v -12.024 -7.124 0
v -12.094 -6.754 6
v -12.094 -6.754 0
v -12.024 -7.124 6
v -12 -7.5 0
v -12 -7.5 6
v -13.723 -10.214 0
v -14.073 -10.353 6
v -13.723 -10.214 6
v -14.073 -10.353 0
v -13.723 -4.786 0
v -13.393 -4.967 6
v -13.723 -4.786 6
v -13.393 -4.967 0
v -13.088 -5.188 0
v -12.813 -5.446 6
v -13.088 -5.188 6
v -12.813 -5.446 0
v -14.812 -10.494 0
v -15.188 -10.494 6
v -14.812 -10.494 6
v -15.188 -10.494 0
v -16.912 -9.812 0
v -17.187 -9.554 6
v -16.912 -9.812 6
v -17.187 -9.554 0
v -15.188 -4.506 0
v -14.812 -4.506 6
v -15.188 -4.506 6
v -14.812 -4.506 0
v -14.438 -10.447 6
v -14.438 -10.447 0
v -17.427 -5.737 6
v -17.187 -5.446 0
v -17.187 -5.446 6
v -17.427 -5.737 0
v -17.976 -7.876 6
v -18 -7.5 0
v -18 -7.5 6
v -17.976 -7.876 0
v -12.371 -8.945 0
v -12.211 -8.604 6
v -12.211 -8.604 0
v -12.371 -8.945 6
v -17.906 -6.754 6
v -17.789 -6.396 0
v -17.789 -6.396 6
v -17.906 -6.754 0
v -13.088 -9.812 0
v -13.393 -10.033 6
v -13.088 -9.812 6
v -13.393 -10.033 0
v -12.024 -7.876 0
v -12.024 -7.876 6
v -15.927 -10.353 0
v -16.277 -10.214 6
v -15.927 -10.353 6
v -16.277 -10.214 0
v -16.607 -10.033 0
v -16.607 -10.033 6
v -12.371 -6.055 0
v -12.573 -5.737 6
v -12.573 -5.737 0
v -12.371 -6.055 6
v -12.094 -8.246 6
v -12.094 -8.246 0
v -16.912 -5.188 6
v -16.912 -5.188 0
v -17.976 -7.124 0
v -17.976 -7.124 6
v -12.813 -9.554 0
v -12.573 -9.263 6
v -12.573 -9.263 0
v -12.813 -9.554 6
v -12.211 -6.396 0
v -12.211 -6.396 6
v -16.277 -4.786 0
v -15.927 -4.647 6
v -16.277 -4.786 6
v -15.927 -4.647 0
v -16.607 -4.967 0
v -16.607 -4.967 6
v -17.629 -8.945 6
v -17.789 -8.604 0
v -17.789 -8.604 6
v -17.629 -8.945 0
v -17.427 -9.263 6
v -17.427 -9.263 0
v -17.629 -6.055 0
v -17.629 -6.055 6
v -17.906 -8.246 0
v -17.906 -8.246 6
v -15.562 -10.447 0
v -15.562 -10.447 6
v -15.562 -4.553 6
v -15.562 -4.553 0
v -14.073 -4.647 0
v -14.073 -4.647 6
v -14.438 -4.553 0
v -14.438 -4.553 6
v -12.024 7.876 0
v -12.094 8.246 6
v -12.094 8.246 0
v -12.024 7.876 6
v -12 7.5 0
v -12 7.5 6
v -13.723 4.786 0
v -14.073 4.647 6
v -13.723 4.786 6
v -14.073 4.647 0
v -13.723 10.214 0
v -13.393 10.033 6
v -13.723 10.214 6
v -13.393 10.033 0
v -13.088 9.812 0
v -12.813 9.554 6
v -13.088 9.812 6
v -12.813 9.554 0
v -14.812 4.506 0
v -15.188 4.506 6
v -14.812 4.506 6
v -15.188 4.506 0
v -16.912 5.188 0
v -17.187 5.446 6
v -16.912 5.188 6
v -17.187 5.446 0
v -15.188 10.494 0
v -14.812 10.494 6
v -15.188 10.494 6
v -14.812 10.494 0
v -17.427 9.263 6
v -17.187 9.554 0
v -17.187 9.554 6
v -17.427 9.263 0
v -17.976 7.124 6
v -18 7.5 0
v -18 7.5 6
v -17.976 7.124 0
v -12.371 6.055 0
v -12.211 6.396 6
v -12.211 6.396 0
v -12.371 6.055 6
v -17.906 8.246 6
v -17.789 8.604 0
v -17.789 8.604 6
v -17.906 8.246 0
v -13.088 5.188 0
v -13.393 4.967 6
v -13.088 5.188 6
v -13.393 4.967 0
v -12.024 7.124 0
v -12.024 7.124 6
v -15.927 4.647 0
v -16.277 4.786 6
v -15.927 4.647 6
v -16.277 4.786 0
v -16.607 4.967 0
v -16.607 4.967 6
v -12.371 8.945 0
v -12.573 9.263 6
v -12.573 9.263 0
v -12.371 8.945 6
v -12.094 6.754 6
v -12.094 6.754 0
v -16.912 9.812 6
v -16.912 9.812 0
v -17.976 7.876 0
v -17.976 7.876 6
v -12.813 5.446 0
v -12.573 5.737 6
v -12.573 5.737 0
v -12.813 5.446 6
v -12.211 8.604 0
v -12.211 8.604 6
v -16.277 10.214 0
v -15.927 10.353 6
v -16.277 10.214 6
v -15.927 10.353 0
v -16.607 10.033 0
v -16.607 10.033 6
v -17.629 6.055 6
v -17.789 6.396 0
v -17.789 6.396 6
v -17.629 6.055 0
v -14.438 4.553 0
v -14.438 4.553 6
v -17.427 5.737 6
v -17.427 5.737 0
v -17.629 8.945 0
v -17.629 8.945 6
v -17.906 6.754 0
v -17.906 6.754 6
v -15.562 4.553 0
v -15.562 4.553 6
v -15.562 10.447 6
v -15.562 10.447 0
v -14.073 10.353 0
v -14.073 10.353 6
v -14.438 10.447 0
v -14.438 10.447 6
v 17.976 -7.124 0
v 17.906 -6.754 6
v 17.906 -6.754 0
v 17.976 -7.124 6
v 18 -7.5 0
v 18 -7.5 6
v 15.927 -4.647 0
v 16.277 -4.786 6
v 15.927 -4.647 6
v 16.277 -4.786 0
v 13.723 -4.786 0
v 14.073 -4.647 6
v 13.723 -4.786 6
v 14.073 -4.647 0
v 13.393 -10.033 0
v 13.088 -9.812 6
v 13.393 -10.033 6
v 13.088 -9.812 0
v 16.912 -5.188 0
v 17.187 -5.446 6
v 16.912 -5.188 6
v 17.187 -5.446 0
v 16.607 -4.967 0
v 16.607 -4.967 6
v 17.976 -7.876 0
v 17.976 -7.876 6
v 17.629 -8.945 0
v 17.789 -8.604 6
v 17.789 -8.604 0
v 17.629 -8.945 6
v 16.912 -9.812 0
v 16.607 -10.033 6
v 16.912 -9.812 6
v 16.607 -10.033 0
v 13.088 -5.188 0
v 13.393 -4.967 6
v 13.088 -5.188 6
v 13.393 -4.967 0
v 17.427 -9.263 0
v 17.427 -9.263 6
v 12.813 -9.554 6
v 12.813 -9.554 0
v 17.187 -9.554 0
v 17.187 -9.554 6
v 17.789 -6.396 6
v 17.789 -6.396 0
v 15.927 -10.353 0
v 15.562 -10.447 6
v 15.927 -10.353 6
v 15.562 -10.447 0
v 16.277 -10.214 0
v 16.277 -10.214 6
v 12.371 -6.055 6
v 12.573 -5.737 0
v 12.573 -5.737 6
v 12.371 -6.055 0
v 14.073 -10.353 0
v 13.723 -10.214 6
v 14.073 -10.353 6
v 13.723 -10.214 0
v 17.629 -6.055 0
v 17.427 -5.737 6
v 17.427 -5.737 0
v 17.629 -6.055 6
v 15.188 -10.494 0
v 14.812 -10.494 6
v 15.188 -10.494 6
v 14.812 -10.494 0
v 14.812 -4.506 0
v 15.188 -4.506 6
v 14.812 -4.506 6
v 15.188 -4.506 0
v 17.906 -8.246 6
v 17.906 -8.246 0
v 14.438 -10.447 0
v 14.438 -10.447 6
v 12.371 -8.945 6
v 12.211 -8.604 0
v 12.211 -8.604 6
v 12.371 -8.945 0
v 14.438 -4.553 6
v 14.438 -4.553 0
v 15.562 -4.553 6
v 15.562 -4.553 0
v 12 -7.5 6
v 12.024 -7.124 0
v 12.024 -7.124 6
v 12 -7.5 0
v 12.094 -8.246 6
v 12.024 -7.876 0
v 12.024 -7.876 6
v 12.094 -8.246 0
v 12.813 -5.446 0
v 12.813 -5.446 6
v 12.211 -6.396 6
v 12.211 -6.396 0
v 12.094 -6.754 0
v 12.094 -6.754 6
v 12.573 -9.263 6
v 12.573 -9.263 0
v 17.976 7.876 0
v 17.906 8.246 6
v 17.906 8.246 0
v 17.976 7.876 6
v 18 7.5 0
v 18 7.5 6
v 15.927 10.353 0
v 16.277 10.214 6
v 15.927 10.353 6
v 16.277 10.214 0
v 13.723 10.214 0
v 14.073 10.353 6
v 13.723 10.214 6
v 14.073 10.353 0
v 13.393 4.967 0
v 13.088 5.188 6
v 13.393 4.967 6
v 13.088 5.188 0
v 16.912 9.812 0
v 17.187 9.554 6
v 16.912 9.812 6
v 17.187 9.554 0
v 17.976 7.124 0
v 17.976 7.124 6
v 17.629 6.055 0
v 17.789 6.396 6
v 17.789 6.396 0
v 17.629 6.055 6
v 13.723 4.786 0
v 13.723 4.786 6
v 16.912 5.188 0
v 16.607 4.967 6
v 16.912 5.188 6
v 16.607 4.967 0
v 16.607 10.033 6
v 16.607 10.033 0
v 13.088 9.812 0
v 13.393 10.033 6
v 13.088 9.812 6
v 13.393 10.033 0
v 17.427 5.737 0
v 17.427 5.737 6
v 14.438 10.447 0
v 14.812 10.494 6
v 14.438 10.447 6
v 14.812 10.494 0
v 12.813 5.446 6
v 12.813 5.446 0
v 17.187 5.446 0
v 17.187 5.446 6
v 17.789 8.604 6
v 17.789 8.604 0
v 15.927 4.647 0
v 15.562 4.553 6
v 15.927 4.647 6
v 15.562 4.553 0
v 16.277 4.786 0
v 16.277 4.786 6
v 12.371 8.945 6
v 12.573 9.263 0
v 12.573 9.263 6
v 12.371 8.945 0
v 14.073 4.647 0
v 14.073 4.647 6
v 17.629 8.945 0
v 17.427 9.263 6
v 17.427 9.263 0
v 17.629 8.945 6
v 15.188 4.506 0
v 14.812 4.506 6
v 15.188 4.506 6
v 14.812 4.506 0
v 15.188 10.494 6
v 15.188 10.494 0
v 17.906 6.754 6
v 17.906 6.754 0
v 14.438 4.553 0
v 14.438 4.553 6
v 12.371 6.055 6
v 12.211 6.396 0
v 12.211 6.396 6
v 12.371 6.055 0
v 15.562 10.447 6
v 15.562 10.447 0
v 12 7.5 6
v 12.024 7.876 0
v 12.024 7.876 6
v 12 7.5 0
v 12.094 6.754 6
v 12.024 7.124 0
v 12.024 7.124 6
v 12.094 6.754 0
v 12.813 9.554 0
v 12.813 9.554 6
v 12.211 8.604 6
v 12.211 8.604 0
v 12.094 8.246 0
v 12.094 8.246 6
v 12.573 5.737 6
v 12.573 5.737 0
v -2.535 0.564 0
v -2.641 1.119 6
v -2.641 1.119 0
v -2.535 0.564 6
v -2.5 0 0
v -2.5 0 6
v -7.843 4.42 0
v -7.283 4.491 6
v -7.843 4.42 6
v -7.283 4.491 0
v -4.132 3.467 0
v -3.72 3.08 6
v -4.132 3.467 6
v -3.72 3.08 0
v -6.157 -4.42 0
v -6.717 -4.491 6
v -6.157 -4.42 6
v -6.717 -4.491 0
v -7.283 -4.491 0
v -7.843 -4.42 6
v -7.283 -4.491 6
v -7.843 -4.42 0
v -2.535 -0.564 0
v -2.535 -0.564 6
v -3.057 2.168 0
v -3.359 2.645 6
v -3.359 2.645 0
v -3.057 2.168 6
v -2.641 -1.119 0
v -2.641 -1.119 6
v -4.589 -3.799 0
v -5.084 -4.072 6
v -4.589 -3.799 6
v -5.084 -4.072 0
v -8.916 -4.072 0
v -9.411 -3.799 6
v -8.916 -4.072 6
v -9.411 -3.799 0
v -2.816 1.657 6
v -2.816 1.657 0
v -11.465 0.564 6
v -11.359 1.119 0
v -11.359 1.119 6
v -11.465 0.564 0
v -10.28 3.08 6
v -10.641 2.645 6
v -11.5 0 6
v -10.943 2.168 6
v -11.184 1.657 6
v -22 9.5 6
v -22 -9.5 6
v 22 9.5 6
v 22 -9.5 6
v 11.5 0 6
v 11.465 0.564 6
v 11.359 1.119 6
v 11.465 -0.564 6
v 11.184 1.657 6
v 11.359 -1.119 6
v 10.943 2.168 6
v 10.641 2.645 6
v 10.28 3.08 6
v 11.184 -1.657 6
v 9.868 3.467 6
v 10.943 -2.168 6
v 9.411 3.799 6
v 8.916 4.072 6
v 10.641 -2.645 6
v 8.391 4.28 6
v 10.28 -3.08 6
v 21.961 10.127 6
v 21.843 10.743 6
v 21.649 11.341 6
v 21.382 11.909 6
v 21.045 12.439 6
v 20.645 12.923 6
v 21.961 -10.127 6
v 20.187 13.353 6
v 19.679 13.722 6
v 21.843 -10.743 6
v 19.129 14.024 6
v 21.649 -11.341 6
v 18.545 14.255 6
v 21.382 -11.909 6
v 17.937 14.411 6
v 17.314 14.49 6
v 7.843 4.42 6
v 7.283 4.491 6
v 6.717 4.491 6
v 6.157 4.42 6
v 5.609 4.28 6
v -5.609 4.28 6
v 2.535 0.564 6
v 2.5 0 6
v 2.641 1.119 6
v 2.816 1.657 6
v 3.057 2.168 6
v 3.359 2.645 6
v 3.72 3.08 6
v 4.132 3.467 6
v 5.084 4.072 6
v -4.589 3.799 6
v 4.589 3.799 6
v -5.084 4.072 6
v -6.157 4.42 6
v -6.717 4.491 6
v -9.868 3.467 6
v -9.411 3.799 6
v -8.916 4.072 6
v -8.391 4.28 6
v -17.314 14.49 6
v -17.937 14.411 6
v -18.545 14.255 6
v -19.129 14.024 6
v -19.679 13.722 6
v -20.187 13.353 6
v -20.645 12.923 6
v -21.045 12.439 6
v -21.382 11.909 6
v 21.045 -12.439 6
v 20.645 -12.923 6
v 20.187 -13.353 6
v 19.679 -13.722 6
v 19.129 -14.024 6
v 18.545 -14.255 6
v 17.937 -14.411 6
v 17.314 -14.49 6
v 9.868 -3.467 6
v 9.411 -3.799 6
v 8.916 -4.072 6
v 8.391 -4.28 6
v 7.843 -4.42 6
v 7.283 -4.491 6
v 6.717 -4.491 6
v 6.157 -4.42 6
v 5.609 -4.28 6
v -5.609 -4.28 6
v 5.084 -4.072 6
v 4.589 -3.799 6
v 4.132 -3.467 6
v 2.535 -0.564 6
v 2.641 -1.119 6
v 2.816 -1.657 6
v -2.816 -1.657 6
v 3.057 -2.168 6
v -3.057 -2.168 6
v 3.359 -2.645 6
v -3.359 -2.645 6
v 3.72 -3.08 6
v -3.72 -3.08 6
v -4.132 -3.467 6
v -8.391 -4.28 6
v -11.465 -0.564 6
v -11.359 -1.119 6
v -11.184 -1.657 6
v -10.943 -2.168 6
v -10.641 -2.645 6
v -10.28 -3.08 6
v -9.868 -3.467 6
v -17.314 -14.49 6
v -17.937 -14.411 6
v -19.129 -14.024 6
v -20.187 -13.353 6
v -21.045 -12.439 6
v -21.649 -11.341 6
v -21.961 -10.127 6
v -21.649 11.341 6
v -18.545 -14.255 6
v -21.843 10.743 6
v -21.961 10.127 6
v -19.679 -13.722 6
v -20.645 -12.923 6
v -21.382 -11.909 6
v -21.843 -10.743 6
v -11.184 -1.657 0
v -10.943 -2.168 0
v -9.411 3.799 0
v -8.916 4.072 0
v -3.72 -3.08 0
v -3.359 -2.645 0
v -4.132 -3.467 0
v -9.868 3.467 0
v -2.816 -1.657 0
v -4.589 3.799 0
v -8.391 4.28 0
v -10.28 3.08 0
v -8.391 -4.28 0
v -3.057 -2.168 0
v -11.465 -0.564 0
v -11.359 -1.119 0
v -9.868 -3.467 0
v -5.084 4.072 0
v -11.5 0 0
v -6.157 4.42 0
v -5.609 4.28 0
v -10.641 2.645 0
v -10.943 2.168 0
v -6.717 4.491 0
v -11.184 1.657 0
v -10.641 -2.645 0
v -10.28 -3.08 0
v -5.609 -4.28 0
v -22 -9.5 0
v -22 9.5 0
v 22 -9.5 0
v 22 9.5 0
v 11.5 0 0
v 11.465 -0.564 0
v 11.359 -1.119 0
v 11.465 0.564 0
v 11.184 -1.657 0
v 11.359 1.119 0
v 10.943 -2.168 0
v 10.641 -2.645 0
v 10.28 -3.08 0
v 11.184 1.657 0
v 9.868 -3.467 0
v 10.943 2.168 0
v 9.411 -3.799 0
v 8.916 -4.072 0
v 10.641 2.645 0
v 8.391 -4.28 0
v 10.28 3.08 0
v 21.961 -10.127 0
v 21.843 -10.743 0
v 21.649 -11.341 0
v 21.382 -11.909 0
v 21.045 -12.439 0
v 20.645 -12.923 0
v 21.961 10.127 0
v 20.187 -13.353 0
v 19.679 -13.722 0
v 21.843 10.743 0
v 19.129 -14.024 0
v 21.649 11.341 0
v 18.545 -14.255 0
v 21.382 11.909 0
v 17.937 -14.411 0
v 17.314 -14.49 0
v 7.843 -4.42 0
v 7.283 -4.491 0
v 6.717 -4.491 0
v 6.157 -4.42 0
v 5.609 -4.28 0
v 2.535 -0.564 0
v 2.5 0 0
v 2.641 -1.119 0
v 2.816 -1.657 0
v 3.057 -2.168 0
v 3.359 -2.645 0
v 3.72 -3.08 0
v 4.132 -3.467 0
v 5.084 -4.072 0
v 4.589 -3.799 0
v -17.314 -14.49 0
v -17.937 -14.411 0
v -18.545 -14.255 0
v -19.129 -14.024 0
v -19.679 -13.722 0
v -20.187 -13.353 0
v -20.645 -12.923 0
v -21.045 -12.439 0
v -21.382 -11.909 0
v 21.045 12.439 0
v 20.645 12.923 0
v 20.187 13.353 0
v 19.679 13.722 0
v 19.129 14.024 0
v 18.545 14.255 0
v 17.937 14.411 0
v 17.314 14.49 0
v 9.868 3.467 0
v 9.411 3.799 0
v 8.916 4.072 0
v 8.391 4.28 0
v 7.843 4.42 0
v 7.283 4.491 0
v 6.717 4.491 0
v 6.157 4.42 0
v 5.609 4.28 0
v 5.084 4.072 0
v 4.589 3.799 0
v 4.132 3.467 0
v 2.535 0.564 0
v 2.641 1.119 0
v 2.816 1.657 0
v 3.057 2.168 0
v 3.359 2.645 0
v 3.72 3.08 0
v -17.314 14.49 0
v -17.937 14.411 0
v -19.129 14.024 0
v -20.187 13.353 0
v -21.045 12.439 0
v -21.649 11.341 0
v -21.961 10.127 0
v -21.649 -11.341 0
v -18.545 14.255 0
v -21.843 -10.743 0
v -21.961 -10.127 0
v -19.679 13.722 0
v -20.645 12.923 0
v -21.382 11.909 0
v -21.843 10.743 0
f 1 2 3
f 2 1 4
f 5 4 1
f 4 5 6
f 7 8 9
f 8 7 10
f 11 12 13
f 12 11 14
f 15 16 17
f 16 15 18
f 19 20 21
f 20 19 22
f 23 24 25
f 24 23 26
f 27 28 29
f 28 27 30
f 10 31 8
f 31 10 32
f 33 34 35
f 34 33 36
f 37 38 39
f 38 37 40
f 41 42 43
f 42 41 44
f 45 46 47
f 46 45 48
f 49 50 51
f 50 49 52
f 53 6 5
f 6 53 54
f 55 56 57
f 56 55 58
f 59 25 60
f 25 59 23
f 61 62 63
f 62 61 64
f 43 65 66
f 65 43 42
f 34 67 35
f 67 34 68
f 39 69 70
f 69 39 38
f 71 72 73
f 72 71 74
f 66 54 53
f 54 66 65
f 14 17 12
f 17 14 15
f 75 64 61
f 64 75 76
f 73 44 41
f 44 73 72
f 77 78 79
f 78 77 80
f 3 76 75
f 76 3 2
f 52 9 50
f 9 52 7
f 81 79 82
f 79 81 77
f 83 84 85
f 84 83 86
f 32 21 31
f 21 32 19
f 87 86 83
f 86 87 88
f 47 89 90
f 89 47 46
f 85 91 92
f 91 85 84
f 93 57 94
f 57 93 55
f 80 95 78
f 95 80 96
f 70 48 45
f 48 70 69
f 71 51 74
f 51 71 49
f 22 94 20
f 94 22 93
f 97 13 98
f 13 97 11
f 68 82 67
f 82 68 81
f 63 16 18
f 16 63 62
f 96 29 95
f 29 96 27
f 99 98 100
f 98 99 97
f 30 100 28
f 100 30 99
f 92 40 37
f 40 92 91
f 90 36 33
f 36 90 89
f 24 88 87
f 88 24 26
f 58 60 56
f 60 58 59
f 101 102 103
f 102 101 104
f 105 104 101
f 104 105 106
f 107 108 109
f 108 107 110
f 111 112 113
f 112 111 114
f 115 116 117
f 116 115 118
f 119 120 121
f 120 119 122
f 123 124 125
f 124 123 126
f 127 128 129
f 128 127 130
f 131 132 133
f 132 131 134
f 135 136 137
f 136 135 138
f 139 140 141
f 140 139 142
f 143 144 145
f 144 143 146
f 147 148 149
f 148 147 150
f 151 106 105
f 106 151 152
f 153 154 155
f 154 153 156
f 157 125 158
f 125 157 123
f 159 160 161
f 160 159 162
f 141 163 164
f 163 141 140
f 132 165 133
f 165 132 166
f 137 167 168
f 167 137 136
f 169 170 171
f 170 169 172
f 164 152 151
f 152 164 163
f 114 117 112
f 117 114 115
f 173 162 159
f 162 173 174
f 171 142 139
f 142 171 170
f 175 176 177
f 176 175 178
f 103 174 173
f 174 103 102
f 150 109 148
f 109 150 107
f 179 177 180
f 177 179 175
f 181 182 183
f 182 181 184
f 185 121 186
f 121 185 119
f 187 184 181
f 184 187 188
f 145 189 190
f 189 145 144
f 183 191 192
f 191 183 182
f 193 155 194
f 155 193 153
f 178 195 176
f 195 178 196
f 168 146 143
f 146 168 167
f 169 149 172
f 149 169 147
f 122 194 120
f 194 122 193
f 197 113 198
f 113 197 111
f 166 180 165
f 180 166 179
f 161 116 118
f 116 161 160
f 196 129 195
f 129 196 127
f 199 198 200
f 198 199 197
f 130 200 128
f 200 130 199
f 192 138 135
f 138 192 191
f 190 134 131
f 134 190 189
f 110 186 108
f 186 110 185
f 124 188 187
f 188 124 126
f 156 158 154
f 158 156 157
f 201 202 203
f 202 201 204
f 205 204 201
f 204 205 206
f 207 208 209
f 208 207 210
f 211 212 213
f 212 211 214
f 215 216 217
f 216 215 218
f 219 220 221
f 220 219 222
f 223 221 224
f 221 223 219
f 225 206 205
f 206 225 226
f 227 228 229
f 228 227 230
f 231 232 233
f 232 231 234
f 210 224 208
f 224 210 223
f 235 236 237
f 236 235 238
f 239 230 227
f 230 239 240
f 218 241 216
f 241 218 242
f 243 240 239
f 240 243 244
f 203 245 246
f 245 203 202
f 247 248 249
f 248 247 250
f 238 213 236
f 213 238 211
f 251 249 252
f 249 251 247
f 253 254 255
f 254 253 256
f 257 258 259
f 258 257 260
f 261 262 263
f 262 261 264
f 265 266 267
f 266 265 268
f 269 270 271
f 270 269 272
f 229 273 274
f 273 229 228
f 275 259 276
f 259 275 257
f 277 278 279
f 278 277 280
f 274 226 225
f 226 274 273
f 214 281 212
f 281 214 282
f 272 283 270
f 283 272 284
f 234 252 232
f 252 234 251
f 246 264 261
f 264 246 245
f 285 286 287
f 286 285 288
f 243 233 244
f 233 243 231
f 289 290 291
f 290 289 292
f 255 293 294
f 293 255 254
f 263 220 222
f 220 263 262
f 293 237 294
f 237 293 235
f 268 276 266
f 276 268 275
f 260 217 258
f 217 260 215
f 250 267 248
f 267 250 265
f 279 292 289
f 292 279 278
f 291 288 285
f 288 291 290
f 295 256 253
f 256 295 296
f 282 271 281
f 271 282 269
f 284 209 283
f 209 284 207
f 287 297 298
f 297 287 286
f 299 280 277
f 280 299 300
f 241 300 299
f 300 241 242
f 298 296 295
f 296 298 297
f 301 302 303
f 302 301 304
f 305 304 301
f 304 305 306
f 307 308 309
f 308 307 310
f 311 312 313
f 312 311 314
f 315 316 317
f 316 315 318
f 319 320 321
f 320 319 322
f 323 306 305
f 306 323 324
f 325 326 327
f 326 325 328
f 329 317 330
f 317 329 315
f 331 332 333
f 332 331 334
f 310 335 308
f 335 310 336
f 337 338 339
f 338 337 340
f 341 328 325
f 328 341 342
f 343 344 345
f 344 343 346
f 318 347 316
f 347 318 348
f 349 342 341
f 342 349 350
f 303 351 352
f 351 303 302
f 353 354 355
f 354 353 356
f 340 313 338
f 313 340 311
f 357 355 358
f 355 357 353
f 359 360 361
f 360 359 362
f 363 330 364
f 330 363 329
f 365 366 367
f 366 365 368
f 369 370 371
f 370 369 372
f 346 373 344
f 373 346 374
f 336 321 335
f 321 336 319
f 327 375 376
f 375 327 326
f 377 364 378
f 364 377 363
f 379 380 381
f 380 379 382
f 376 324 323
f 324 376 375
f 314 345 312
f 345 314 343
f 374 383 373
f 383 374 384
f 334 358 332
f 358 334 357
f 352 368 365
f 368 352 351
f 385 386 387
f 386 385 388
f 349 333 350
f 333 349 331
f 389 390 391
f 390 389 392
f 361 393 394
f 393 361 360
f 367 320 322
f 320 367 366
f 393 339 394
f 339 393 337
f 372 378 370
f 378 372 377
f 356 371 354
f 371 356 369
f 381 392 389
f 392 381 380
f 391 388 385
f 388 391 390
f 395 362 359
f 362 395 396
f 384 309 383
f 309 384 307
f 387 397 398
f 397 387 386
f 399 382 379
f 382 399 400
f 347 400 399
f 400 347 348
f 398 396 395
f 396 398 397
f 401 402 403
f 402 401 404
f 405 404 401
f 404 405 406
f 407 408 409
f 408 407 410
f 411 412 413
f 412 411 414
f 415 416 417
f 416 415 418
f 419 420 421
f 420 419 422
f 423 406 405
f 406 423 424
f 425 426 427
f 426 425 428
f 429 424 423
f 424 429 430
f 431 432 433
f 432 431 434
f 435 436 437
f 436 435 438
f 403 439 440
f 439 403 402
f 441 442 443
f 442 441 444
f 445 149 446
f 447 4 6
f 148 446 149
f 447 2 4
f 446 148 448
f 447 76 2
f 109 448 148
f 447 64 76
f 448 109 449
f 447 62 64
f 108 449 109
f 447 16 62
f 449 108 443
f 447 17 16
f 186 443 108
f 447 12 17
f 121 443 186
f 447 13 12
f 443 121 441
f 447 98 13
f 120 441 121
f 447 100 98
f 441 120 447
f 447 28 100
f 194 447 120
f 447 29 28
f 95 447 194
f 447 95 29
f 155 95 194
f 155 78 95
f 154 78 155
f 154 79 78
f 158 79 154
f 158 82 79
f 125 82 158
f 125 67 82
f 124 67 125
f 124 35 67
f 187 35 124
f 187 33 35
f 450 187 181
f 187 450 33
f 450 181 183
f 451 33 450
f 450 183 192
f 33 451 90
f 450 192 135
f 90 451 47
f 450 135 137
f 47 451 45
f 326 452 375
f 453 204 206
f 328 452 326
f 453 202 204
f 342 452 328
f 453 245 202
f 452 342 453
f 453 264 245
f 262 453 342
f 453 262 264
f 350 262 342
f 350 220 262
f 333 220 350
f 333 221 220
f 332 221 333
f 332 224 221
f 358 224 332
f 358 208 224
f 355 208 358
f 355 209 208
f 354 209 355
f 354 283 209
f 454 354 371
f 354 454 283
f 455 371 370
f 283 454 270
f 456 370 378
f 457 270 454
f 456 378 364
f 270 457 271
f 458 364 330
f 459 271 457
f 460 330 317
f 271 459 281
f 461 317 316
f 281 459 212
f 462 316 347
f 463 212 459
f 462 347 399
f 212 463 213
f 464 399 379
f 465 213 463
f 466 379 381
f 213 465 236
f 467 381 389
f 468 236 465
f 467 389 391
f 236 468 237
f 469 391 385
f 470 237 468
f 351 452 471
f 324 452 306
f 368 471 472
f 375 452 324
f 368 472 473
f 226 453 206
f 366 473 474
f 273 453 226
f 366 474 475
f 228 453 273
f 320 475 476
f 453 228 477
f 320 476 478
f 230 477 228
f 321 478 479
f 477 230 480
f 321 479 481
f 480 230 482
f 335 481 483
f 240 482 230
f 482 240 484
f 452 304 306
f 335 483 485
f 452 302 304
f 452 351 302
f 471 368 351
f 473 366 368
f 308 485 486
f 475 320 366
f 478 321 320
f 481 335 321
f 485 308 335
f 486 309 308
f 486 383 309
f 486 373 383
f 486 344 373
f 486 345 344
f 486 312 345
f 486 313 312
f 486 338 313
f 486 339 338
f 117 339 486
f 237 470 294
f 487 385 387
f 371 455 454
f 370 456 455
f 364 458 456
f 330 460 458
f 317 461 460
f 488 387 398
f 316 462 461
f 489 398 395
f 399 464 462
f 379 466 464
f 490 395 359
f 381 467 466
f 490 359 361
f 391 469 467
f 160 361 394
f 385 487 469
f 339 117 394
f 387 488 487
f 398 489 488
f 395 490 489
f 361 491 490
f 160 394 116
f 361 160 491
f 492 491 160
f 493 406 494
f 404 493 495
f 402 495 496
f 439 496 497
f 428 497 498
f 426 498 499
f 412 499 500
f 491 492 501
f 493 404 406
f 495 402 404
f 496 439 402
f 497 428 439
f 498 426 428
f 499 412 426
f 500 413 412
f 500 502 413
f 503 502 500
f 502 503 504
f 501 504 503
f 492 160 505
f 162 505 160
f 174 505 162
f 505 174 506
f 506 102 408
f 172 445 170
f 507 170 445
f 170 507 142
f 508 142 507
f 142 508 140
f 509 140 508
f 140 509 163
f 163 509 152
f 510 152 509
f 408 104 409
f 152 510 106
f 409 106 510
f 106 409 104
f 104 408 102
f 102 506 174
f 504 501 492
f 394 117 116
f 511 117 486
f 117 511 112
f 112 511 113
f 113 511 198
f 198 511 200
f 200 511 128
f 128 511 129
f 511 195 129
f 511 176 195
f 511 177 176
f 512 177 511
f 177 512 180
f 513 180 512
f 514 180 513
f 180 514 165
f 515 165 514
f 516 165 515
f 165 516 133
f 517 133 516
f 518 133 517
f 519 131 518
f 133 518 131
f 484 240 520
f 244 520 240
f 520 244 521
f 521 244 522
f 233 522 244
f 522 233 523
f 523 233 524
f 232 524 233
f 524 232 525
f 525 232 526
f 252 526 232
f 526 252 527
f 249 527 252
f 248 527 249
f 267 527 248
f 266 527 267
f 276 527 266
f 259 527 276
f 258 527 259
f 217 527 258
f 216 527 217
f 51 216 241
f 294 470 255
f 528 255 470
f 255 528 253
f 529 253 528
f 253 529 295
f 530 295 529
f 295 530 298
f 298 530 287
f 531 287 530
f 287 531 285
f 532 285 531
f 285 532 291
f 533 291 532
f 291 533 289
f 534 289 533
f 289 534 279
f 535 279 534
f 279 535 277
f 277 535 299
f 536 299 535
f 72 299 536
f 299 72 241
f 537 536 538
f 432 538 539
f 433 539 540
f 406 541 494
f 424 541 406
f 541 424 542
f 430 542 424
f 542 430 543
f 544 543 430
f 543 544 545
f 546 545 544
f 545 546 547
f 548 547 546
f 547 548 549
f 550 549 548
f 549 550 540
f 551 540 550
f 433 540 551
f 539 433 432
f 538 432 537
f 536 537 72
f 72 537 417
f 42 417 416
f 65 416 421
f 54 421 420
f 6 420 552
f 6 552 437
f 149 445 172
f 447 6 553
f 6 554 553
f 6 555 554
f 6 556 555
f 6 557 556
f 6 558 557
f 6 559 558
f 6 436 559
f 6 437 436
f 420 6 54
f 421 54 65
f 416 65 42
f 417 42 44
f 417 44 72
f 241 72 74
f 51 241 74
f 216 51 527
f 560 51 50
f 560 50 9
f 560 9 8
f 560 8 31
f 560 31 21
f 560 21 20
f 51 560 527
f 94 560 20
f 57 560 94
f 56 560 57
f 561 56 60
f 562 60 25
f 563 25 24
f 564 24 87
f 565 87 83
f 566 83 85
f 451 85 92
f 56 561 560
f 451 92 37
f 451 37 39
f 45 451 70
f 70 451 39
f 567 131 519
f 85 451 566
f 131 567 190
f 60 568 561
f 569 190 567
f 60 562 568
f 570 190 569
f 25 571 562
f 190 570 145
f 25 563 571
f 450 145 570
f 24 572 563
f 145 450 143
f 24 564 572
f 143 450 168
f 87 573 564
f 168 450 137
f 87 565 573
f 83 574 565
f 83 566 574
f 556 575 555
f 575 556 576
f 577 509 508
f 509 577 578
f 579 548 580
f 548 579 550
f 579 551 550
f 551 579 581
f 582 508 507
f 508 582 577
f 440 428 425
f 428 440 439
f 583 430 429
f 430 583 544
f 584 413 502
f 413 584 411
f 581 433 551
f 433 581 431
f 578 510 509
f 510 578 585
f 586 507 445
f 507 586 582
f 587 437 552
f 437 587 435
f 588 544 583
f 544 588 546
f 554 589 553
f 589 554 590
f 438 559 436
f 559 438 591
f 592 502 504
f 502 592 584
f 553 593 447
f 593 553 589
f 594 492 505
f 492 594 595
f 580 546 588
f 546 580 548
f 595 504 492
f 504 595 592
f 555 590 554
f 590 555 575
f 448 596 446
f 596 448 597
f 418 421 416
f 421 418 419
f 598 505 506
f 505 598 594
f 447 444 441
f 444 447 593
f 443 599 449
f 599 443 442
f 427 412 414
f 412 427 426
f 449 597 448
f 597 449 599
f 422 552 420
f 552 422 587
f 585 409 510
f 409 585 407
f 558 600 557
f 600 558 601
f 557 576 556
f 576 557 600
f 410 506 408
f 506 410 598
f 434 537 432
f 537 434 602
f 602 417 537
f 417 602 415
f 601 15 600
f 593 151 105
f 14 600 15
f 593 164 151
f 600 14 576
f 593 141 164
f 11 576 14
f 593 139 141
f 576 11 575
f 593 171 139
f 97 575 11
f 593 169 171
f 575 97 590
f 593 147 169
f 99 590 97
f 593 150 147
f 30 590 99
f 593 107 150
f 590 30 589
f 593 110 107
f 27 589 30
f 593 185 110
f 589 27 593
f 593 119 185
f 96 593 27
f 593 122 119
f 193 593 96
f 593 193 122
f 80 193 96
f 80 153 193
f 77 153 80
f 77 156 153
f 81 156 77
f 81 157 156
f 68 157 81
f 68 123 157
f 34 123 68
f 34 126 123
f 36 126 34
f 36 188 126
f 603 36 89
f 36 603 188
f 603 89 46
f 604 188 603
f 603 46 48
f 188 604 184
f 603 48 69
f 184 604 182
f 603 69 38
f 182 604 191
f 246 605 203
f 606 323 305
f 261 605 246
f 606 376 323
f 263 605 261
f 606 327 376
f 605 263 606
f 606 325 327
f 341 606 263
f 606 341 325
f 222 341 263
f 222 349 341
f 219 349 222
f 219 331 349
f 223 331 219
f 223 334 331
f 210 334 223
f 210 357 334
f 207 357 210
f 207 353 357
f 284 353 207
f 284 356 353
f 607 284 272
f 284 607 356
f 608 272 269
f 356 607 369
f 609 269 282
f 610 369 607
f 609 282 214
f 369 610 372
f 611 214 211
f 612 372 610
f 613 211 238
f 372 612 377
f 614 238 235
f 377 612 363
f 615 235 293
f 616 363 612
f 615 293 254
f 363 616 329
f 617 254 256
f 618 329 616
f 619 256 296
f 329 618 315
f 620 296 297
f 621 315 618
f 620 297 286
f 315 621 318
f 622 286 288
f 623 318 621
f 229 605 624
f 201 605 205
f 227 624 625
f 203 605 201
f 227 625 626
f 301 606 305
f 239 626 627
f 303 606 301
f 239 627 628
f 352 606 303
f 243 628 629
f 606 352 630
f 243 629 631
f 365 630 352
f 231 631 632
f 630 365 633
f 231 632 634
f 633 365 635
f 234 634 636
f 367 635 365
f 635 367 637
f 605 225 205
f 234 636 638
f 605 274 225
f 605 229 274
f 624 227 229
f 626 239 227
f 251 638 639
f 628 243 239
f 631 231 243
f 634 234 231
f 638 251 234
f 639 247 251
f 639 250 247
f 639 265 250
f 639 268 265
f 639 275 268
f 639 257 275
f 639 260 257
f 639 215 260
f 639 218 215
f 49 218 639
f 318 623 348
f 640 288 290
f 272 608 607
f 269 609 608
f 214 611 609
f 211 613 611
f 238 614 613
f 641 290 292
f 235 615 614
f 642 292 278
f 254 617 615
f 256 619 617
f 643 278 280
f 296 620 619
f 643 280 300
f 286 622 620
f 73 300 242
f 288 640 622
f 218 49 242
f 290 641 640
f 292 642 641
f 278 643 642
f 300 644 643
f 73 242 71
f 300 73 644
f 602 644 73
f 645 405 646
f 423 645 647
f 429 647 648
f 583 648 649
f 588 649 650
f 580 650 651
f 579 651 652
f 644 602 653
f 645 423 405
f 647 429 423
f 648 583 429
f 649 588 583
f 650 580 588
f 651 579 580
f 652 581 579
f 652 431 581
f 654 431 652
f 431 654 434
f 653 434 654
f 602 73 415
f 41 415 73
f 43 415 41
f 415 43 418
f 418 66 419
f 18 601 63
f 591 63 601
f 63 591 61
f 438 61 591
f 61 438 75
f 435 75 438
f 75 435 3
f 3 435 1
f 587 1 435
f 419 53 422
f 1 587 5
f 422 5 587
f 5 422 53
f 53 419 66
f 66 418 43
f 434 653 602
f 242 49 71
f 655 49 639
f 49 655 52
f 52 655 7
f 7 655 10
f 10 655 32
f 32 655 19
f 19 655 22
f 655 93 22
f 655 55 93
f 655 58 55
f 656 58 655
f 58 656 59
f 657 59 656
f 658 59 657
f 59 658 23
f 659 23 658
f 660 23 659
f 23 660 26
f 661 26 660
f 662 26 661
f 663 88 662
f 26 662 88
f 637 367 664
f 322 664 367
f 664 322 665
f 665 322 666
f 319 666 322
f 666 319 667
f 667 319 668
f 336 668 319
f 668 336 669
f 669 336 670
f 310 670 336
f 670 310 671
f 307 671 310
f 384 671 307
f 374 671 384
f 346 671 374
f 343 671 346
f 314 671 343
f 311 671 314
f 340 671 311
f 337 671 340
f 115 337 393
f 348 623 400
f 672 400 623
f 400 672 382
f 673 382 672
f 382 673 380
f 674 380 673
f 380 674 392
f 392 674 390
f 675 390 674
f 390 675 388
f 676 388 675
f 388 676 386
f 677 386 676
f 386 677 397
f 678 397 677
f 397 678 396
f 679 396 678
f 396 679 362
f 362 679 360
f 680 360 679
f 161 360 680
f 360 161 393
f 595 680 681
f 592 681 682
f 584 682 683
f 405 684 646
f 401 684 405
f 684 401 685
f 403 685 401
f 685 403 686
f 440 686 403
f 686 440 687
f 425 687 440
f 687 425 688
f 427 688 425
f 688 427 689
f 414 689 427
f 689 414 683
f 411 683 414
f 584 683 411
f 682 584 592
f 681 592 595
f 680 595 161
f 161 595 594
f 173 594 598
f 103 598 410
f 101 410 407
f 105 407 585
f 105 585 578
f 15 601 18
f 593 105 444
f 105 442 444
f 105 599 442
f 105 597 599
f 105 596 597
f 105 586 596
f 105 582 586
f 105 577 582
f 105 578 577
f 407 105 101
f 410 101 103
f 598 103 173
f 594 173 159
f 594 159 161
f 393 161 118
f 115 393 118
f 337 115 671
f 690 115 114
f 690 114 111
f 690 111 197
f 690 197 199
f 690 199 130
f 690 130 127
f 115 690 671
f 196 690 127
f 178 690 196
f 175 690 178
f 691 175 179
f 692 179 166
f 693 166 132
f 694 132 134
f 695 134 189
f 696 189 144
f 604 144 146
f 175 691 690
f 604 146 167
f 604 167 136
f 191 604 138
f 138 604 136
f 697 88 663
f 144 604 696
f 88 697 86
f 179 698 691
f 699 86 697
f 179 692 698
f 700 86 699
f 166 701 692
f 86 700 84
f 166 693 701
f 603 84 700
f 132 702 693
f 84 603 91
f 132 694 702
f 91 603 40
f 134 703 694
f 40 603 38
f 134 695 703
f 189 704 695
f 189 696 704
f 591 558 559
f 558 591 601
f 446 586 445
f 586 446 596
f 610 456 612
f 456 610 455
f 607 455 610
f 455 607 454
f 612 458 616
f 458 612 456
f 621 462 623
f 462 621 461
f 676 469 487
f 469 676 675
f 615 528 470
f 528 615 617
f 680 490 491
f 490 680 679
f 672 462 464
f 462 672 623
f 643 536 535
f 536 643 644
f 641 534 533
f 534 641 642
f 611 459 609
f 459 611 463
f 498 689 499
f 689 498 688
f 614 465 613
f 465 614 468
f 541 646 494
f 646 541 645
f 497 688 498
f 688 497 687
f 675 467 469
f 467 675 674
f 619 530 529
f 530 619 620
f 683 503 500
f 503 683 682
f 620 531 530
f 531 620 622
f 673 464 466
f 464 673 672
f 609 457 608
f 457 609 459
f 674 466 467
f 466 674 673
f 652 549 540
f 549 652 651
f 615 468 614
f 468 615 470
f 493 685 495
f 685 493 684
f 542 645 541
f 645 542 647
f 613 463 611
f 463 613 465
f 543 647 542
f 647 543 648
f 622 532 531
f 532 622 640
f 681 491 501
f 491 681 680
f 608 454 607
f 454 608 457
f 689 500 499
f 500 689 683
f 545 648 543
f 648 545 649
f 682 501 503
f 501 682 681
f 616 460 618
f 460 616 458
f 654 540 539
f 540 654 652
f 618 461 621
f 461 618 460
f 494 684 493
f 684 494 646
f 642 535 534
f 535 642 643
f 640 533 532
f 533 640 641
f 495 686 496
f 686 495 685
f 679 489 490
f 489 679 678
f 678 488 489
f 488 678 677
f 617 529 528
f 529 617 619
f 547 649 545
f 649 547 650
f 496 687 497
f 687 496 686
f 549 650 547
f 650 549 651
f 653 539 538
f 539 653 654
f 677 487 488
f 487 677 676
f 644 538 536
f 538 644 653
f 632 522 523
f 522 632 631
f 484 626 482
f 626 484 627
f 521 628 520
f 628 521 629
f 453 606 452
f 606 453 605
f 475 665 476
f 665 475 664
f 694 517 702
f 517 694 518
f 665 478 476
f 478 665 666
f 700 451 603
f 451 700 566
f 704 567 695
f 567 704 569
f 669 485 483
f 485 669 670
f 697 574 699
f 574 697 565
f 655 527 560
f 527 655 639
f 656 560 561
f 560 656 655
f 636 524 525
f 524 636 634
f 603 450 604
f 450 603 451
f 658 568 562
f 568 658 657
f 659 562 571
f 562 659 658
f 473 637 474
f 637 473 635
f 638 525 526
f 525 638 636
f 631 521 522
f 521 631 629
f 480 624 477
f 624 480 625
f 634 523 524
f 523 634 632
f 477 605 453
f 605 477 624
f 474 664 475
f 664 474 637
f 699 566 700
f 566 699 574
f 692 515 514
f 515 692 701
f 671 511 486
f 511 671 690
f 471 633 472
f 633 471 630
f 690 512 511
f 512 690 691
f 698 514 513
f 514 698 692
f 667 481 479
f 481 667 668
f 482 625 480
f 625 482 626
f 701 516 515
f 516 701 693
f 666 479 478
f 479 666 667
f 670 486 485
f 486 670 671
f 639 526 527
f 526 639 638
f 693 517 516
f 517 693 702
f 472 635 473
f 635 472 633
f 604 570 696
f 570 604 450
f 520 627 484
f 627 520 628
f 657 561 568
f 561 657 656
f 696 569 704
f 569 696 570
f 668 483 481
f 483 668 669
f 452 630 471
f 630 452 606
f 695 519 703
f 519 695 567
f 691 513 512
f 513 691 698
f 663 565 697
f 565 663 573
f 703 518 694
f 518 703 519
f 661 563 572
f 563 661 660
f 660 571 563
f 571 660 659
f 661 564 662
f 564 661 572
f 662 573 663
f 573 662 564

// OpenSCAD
$fn = 50;


difference() {
	union() {
		hull() {
			translate(v = [-17.0000000000, 9.5000000000, 0]) {
				cylinder(h = 6, r = 5);
			}
			translate(v = [17.0000000000, 9.5000000000, 0]) {
				cylinder(h = 6, r = 5);
			}
			translate(v = [-17.0000000000, -9.5000000000, 0]) {
				cylinder(h = 6, r = 5);
			}
			translate(v = [17.0000000000, -9.5000000000, 0]) {
				cylinder(h = 6, r = 5);
			}
		}
	}
	union() {
		#translate(v = [-15.0000000000, -7.5000000000, -100.0000000000]) {
			cylinder(h = 200, r = 3.0000000000);
		}
		#translate(v = [-15.0000000000, 7.5000000000, -100.0000000000]) {
			cylinder(h = 200, r = 3.0000000000);
		}
		#translate(v = [15.0000000000, -7.5000000000, -100.0000000000]) {
			cylinder(h = 200, r = 3.0000000000);
		}
		#translate(v = [15.0000000000, 7.5000000000, -100.0000000000]) {
			cylinder(h = 200, r = 3.0000000000);
		}
		#translate(v = [-7.0000000000, 0, 0]) {
			cylinder(h = 6, r = 4.5000000000);
		}
		#translate(v = [7.0000000000, 0, 0]) {
			cylinder(h = 6, r = 4.5000000000);
		}
	}
}
